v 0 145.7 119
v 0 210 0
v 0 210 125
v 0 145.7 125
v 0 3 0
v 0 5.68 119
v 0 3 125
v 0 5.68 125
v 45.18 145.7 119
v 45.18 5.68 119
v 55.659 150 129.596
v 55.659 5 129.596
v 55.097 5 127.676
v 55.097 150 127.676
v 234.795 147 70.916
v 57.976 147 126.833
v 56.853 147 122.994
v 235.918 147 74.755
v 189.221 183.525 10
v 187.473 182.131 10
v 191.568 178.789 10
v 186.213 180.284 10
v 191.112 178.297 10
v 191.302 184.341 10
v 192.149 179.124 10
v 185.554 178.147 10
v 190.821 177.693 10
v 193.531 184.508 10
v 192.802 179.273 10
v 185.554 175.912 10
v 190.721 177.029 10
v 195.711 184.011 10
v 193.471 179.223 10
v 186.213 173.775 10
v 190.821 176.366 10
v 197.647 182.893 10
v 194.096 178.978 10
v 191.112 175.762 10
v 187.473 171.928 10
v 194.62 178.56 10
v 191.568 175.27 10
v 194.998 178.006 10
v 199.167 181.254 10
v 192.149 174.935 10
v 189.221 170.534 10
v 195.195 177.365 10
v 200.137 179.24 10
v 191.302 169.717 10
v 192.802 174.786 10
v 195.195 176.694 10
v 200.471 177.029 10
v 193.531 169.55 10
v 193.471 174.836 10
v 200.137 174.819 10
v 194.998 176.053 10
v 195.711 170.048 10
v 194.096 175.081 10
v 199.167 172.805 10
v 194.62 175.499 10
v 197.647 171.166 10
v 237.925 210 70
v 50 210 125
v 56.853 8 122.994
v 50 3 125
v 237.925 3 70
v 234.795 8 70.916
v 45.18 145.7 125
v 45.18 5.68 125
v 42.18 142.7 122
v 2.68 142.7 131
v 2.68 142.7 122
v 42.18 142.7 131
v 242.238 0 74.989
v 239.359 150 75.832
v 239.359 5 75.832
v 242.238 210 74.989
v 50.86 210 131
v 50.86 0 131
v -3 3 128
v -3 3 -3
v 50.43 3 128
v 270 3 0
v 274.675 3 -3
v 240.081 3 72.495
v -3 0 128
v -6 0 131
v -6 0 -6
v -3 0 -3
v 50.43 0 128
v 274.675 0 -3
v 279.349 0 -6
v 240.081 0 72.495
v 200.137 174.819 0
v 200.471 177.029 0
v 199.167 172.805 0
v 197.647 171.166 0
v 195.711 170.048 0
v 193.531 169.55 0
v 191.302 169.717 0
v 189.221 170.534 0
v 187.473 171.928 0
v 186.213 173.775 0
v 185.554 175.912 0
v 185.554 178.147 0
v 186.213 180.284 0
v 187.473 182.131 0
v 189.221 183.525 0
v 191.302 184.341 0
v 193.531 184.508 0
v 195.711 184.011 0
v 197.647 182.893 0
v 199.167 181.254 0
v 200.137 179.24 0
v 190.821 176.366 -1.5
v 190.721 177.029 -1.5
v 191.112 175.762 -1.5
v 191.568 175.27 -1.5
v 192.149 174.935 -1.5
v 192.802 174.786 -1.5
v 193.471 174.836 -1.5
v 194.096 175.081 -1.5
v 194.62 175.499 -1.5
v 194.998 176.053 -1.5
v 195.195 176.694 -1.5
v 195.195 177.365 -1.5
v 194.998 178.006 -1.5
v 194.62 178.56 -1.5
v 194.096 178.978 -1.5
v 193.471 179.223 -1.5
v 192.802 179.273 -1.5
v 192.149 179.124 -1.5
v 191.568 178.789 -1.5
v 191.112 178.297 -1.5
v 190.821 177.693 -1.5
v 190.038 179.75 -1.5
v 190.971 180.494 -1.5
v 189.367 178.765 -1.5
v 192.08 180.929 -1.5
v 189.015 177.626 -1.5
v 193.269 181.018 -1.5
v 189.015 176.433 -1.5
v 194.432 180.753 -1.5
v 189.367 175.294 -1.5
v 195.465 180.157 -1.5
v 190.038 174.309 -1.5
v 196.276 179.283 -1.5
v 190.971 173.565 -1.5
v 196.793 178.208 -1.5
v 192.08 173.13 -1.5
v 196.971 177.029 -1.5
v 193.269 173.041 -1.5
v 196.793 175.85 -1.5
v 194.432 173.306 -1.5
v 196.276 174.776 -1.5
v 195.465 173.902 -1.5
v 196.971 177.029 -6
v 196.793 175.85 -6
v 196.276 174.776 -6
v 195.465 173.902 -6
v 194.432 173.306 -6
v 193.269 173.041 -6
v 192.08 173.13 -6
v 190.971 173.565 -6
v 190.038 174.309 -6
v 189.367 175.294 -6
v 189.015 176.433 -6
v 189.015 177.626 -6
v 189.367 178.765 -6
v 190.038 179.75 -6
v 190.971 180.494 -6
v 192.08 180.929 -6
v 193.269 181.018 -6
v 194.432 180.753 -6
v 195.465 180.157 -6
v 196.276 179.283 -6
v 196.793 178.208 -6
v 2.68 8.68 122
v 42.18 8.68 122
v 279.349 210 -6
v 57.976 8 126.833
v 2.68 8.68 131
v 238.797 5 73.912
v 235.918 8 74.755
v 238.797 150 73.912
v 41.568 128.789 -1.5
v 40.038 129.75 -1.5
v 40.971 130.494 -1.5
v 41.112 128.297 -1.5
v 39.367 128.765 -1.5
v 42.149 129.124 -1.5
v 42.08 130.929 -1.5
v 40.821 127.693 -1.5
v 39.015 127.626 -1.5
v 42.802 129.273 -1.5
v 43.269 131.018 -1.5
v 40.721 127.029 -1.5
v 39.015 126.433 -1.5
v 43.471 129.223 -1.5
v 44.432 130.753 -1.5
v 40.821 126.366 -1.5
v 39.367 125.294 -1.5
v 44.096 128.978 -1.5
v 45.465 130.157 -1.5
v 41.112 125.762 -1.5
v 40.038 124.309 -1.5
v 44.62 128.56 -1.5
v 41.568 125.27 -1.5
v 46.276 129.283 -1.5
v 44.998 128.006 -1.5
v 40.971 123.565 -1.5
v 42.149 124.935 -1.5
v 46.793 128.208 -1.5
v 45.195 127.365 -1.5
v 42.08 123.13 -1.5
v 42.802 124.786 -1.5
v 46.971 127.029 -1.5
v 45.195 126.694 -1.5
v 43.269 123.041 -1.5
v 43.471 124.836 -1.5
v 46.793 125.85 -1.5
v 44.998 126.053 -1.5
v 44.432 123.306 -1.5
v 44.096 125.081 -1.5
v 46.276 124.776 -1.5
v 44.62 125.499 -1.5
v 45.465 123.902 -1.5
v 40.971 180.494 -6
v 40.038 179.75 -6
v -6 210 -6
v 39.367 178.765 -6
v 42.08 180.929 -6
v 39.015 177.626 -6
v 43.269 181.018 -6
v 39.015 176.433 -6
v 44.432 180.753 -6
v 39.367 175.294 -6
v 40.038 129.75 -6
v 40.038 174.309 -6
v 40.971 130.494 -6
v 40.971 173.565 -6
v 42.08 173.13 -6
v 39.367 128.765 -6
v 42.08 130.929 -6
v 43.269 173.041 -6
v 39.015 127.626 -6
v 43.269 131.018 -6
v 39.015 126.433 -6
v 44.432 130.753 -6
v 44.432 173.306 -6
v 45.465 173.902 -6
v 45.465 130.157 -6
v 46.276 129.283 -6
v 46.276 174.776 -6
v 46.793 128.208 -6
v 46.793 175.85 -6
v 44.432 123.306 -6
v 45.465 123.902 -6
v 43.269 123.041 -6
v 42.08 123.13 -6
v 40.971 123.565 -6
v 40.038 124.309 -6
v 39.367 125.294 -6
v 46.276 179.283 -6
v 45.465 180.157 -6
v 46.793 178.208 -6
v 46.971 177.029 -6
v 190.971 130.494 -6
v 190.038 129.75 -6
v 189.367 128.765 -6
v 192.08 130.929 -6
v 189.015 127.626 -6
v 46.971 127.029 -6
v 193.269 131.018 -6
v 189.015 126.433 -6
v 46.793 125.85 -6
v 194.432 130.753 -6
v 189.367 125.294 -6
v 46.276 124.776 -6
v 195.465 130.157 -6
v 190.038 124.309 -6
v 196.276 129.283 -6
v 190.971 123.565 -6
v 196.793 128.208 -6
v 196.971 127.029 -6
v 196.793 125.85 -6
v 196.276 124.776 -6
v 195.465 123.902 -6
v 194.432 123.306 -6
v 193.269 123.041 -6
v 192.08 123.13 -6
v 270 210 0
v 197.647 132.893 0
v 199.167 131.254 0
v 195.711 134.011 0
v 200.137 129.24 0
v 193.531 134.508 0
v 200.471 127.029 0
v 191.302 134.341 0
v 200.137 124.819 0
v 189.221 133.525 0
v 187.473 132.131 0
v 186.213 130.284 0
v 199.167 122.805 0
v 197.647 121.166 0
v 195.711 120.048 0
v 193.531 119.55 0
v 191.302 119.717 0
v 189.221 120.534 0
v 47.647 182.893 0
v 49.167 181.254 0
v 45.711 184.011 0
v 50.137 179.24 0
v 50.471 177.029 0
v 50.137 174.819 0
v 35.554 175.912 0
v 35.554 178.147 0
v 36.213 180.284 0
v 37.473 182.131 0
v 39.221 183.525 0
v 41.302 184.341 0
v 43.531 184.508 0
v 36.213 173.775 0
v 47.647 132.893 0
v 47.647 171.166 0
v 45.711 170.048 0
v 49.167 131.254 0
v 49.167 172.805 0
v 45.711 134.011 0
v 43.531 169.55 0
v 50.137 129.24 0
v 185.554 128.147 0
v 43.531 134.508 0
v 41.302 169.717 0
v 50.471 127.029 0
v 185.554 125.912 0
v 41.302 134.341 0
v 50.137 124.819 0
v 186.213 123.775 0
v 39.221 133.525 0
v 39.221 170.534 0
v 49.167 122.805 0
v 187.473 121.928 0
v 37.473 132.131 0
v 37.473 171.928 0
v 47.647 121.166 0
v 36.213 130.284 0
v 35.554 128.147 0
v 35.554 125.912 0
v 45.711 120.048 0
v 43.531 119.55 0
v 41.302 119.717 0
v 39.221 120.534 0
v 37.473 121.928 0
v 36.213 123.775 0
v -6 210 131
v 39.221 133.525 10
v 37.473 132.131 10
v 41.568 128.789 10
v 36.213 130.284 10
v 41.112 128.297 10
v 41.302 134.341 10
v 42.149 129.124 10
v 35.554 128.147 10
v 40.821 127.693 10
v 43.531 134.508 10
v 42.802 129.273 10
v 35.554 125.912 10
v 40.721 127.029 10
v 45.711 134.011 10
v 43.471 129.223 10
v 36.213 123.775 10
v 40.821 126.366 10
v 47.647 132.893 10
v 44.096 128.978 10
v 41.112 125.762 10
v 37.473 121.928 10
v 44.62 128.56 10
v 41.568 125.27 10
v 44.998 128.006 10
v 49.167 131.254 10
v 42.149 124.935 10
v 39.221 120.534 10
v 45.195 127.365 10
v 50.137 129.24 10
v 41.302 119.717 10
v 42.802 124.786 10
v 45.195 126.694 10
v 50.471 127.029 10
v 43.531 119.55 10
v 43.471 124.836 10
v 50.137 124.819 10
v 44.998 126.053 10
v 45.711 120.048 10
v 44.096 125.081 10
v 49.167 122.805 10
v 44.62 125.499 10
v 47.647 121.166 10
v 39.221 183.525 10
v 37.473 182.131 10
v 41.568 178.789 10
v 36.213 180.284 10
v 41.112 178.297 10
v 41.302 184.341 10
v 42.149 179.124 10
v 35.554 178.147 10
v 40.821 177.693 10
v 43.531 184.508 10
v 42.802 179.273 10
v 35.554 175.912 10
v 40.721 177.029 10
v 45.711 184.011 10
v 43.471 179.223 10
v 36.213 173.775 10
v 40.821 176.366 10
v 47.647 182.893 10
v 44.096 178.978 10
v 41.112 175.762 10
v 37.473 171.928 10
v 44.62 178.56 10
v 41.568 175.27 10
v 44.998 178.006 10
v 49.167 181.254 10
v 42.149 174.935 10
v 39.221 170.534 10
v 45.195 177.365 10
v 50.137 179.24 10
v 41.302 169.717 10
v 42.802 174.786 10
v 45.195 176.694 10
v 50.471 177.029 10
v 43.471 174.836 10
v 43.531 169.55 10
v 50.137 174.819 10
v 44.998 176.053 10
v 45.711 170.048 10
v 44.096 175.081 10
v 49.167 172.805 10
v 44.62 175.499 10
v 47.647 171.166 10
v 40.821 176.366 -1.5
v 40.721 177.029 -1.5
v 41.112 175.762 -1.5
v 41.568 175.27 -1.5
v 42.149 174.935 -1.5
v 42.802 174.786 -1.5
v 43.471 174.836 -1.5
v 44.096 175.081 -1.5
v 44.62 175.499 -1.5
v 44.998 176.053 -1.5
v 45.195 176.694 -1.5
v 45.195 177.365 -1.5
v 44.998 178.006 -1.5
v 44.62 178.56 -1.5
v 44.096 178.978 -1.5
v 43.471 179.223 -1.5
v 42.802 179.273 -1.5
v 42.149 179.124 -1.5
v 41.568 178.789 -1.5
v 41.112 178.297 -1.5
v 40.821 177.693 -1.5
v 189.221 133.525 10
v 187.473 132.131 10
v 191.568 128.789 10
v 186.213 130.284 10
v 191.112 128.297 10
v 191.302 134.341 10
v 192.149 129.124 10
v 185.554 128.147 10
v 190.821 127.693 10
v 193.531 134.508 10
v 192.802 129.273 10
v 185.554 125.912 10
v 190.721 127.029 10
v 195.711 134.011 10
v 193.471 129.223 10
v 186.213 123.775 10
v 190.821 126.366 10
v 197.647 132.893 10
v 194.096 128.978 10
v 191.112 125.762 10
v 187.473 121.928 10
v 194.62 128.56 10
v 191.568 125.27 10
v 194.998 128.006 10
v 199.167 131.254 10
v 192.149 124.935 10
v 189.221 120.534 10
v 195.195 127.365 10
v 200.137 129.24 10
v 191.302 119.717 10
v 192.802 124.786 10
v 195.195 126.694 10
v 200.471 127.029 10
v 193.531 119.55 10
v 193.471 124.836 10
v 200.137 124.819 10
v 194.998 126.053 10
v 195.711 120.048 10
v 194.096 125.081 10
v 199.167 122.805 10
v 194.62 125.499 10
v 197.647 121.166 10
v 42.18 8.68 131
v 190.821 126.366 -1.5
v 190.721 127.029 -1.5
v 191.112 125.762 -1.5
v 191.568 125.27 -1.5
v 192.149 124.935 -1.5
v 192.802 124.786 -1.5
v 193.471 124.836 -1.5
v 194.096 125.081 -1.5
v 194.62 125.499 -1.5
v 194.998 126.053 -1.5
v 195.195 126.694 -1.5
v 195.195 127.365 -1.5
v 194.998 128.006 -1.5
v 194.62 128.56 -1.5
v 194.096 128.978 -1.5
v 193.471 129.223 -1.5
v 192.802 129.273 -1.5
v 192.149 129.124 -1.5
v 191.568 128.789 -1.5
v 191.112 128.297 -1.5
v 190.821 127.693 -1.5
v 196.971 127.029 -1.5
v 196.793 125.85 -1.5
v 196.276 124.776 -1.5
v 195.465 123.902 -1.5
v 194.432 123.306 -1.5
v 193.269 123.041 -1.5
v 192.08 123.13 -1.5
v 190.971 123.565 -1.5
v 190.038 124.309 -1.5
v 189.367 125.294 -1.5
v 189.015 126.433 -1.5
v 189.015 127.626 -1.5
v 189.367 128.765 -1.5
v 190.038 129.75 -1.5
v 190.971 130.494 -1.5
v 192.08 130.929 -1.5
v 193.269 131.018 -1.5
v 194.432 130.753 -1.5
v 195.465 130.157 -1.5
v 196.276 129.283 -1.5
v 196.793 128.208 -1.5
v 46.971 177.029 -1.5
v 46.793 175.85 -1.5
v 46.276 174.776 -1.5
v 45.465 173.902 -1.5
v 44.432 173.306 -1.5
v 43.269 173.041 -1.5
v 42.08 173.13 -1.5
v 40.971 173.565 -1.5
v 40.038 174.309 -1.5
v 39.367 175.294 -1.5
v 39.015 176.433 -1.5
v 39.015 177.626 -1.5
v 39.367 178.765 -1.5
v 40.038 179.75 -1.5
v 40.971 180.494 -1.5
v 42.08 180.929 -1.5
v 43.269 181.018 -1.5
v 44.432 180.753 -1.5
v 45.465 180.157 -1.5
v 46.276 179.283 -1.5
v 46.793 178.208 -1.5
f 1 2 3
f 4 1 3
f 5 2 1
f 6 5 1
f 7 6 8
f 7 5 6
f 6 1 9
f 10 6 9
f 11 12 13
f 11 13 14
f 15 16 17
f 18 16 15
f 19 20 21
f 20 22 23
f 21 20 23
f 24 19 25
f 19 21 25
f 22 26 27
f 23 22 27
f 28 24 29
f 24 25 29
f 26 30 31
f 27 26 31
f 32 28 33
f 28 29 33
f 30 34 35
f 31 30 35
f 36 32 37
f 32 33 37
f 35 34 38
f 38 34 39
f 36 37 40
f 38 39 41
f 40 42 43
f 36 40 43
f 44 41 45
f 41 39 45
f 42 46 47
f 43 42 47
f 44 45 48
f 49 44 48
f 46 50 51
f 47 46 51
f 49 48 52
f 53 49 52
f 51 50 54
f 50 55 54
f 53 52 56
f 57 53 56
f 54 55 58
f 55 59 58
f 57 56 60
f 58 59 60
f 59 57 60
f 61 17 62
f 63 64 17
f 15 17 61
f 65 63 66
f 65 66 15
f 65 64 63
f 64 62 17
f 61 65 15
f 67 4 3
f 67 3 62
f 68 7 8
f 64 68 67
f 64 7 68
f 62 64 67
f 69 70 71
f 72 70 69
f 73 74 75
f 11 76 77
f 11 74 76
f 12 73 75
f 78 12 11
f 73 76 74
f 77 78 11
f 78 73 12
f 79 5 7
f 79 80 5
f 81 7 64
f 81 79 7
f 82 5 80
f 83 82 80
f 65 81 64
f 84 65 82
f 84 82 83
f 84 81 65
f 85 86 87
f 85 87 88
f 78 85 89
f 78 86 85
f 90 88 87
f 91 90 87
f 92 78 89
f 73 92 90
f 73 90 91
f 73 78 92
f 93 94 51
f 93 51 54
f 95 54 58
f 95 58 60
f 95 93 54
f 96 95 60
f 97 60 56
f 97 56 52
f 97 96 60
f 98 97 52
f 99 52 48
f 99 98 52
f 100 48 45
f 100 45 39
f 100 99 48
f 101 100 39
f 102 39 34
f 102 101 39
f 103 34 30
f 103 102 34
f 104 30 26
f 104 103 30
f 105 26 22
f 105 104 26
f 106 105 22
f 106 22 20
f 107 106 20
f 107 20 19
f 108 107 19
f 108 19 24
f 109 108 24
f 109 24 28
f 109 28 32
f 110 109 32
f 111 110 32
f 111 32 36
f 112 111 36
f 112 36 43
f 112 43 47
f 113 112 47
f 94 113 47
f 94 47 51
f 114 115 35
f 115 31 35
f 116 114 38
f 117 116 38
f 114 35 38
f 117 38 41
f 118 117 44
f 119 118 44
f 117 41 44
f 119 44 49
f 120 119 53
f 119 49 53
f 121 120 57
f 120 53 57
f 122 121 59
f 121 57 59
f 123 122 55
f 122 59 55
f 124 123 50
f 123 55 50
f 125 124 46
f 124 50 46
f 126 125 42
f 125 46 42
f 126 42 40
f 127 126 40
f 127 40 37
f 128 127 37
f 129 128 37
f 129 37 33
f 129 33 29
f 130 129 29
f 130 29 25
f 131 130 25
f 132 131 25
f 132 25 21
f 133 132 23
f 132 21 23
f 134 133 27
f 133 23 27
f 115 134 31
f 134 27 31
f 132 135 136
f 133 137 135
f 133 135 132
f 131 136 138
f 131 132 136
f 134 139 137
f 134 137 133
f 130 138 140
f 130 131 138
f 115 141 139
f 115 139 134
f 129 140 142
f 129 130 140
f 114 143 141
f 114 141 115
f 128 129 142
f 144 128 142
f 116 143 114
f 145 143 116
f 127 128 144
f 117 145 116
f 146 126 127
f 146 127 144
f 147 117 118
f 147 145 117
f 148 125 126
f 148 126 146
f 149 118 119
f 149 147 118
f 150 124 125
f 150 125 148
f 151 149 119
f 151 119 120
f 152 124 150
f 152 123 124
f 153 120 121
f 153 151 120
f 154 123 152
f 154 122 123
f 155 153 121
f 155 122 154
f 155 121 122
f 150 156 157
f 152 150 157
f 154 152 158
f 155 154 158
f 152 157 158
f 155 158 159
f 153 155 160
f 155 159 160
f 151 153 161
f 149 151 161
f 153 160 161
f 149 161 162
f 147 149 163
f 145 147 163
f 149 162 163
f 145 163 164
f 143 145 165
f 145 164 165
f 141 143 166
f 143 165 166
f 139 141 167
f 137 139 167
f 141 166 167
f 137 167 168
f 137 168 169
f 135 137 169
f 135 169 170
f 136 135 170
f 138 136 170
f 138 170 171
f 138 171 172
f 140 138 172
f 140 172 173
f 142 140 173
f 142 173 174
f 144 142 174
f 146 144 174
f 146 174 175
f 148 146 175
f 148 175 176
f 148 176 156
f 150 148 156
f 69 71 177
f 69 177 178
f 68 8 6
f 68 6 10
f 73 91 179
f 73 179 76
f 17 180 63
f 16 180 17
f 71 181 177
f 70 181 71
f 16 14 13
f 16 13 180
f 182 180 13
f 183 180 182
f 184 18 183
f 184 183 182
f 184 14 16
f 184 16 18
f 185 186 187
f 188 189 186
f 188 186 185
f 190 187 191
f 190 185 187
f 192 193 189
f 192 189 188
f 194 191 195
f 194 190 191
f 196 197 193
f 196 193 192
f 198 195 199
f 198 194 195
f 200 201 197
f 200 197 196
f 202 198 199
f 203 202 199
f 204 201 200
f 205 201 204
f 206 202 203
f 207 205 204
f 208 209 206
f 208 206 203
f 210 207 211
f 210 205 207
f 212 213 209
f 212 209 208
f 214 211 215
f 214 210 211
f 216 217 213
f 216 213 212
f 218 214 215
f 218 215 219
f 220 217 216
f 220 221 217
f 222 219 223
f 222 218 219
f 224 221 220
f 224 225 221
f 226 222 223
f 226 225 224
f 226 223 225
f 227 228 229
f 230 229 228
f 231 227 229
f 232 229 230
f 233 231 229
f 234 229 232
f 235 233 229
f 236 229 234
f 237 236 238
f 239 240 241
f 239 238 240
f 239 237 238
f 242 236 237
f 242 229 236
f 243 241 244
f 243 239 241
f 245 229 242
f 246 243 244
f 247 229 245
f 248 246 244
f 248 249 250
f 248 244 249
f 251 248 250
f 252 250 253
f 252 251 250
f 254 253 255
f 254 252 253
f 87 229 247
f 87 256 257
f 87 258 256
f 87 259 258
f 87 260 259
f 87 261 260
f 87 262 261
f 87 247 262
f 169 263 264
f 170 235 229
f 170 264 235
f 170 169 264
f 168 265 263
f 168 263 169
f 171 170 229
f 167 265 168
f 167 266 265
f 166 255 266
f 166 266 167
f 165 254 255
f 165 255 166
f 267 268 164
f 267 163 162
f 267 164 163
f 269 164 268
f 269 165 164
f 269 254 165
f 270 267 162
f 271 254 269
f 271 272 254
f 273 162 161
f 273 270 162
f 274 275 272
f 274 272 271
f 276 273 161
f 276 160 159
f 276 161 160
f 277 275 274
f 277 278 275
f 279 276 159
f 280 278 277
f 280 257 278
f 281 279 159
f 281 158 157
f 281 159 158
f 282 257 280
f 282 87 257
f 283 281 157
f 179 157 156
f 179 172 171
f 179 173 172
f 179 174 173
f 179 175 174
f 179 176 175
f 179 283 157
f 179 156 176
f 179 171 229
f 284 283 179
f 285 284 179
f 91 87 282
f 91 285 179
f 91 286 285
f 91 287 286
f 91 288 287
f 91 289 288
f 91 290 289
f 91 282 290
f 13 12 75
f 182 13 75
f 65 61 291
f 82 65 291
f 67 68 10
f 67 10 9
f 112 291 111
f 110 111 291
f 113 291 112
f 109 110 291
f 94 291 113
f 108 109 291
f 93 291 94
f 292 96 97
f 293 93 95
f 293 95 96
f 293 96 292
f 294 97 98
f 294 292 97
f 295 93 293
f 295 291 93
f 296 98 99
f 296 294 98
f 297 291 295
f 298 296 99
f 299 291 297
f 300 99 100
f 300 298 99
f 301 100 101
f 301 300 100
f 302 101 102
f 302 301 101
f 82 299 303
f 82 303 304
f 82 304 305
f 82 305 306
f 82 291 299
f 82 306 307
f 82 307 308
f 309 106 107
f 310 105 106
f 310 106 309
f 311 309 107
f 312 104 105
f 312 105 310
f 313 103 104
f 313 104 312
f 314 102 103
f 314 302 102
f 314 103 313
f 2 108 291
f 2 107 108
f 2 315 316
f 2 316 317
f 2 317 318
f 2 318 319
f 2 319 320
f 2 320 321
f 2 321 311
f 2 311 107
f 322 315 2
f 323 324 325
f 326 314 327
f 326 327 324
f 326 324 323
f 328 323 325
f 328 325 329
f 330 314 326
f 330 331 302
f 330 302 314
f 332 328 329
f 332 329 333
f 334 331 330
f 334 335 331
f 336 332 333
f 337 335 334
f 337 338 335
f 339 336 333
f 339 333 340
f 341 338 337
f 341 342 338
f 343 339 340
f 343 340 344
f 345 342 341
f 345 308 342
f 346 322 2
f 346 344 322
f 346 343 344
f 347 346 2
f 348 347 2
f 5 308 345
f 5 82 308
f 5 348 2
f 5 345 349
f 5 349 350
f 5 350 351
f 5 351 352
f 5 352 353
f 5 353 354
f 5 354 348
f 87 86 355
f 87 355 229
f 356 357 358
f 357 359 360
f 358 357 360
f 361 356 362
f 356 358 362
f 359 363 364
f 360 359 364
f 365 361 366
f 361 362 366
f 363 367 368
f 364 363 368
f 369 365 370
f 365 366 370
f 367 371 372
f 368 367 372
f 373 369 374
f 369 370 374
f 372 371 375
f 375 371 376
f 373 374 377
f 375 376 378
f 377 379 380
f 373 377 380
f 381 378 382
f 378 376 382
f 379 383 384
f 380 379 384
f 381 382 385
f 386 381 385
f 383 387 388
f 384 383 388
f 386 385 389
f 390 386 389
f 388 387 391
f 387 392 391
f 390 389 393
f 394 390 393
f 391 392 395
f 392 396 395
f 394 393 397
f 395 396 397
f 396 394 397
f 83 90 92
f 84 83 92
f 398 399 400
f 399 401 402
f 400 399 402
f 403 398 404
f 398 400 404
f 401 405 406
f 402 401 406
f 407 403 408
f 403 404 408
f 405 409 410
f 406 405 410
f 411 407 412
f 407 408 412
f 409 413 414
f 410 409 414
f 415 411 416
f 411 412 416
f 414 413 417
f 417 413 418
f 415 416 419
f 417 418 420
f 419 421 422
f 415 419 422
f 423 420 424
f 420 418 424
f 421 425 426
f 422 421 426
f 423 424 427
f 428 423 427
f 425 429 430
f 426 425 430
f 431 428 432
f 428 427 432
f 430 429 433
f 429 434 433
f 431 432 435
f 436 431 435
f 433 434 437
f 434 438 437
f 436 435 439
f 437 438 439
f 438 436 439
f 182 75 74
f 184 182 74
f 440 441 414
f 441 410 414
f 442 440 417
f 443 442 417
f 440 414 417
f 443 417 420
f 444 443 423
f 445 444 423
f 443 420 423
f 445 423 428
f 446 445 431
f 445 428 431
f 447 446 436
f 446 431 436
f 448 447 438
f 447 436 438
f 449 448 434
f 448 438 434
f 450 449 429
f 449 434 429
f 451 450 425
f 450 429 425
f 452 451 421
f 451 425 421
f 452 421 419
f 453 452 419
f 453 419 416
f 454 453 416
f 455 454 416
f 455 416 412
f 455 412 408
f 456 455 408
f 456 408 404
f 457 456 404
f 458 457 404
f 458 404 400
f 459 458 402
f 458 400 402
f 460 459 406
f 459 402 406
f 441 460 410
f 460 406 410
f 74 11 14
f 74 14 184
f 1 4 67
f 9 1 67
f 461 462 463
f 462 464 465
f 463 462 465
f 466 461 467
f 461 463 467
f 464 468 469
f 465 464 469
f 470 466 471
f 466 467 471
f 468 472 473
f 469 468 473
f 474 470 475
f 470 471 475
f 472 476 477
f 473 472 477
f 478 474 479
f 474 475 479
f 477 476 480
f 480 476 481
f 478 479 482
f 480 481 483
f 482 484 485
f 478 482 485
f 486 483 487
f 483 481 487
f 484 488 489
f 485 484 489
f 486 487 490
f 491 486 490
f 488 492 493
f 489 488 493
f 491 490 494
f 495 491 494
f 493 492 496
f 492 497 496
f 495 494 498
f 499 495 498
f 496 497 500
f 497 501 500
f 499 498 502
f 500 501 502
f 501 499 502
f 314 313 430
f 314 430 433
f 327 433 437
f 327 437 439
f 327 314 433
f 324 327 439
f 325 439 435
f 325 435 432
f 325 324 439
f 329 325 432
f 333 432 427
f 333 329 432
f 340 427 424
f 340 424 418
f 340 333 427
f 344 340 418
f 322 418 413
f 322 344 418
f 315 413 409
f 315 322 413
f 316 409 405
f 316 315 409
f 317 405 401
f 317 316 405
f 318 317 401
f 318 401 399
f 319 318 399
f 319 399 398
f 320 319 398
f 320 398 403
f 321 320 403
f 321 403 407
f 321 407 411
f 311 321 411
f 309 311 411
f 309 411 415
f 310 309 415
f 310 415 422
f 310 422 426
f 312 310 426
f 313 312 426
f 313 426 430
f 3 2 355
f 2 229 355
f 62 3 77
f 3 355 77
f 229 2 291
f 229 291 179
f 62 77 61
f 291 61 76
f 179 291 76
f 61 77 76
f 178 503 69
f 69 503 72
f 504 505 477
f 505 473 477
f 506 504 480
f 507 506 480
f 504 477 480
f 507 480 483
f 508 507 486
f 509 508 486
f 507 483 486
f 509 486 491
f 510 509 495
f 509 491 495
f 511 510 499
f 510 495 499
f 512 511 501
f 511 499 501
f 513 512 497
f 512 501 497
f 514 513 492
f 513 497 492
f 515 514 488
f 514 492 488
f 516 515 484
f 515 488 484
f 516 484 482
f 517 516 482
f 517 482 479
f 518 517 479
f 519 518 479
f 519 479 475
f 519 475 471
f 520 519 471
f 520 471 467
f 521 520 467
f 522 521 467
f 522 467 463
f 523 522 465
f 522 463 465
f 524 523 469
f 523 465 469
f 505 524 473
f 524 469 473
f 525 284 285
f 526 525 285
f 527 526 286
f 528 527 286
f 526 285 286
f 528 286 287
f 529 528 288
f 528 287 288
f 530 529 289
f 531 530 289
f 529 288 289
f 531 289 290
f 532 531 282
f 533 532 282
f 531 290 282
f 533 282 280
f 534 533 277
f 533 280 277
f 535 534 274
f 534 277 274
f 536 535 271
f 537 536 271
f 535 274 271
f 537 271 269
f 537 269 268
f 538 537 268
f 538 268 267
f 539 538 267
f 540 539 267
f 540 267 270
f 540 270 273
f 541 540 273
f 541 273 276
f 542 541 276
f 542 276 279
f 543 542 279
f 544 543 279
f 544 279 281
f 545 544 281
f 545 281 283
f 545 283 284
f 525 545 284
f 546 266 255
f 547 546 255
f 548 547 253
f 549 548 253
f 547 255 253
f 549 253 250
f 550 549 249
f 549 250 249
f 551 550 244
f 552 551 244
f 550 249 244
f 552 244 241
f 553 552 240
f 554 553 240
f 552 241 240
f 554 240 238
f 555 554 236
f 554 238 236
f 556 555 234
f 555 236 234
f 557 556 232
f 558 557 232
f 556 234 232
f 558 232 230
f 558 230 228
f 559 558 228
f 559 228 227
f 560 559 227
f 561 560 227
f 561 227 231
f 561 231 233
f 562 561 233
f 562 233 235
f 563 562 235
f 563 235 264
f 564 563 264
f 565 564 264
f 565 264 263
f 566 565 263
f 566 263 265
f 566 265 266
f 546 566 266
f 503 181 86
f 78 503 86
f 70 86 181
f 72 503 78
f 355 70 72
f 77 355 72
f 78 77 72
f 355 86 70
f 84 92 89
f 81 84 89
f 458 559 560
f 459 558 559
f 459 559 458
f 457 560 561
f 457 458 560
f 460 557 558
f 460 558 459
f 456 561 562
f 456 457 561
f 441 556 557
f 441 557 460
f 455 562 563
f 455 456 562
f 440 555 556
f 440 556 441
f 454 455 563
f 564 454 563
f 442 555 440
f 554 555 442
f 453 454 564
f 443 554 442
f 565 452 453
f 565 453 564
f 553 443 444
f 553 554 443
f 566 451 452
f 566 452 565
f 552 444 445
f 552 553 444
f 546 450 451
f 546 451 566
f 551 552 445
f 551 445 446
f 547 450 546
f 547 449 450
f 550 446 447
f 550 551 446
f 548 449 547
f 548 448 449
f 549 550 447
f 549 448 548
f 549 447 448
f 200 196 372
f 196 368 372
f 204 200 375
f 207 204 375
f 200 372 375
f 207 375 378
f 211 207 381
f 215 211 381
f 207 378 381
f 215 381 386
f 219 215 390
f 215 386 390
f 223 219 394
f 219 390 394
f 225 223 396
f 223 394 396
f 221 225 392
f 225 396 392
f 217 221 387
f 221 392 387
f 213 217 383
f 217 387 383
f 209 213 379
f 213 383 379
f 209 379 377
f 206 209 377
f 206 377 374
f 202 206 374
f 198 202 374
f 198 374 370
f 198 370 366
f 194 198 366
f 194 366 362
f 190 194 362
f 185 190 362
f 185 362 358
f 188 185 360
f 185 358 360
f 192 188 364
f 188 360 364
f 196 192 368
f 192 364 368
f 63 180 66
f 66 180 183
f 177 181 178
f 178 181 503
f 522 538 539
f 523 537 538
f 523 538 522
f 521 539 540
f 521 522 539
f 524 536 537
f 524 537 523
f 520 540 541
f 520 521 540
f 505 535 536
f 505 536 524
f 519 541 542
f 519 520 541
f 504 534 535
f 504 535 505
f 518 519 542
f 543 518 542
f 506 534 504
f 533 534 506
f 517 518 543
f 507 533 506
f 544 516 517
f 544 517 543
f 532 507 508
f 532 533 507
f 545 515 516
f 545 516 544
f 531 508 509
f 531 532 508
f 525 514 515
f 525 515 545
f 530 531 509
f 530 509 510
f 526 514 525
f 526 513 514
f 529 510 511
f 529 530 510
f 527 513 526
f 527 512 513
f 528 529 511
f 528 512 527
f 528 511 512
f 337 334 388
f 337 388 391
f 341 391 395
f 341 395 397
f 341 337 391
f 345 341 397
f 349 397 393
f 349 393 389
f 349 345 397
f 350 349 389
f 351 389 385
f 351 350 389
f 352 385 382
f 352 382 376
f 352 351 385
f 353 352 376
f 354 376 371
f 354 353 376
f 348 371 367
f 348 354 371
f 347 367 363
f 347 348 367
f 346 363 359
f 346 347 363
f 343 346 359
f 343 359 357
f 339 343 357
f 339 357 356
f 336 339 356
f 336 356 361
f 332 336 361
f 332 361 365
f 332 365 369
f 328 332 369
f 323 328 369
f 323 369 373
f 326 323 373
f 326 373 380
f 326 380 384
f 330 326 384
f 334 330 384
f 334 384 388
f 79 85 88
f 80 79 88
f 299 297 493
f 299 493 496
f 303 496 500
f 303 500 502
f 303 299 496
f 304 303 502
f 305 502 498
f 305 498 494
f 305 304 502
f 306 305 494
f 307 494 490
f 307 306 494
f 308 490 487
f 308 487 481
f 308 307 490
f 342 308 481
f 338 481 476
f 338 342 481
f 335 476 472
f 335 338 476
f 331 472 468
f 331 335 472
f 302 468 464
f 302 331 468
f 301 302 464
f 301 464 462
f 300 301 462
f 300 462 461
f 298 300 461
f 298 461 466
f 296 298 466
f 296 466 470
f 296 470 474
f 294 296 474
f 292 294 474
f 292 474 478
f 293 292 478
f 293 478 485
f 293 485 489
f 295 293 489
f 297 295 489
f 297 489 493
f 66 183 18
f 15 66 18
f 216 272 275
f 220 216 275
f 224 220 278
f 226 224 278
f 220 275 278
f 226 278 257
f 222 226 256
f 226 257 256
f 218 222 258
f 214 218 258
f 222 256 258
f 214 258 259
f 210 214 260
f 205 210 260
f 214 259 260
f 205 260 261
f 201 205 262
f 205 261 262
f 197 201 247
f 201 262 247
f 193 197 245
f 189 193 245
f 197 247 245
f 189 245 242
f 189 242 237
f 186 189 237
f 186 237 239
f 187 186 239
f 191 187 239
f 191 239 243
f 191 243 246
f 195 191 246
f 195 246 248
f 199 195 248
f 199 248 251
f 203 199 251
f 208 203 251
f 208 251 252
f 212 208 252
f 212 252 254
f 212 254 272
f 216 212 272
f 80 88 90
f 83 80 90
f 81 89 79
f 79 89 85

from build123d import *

# Parameters (mm, degrees)
F2_DEPTH        = 210
F4_W            = 185.4063174448
F4_H            = 139
F5_DEPTH        = 6
F4_W_2          = 191.4063174448
F4_H_2          = 145
F6_DEPTH        = 2
F7_W            = 45.5
F7_H            = 140.02
F7_W_2          = 39.5
F7_H_2          = 134.02
F8_DEPTH        = 12
F9_DEPTH        = 9
F10_DEPTH       = 3
F3_R            = 7.5
F11_DEPTH       = 16
F12_D           = 4.5
F12_DEPTH       = 40
F12_CBORE_D     = 8
F12_CBORE_DEPTH = 4.5
F12_TIP         = 1.3519363928


with BuildPart() as f2:
    # F1 (on Front) → F2 (new body)
    with BuildSketch(Plane.XZ):
        Polygon((50.8599747535, 131), (-6, 131), (-6, -6), (279.3492325705, -6), (242.2383099785, 74.989177444), align=None)
        Polygon((240.0814283237, 72.494588722), (274.6746162852, -3), (-3, -3), (-3, 128), (50.4299873767, 128), align=None, mode=Mode.SUBTRACT)
        Polygon((-3, -3), (274.6746162852, -3), (240.0814283237, 72.494588722), (50.4299873767, 128), (-3, 128), align=None)
        Polygon((270, 0), (0, 0), (0, 125), (50, 125), (237.9245466688, 70), align=None, mode=Mode.SUBTRACT)
    extrude(amount=-F2_DEPTH)

    # F4 (on face) → F5 (cut, through all)
    with BuildSketch(Plane(origin=(39.3276682275, 0, 134.3751676945), x_dir=(0.9597405823, 0, -0.280887904), z_dir=(0.280887904, 0, 0.9597405823))):
        with Locations((112.7192250827, 77.5)):
            Rectangle(F4_W, F4_H)
    extrude(amount=-F5_DEPTH, mode=Mode.SUBTRACT)

    # F4 (on face) → F6 (cut)
    with BuildSketch(Plane(origin=(39.3276682275, 0, 134.3751676945), x_dir=(0.9597405823, 0, -0.280887904), z_dir=(0.280887904, 0, 0.9597405823))):
        with Locations((112.7192250827, 77.5)):
            Rectangle(F4_W_2, F4_H_2)
        with Locations((112.7192250827, 77.5)):
            Rectangle(F4_W, F4_H, mode=Mode.SUBTRACT)
    extrude(amount=-F6_DEPTH, mode=Mode.SUBTRACT)

    # F7 (on face) → F8 (join)
    with BuildSketch(Plane.XY.offset(131)):
        with Locations((22.4299873767, 75.6899873767)):
            Rectangle(F7_W, F7_H)
        with Locations((22.4299873767, 75.6899873767)):
            Rectangle(F7_W_2, F7_H_2, mode=Mode.SUBTRACT)
        with Locations((22.4299873767, 75.6899873767)):
            Rectangle(F7_W_2, F7_H_2)
    extrude(amount=-F8_DEPTH)

    # F7 (on face) → F9 (cut)
    with BuildSketch(Plane.XY.offset(131)):
        with Locations((22.4299873767, 75.6899873767)):
            Rectangle(F7_W_2, F7_H_2)
    extrude(amount=-F9_DEPTH, mode=Mode.SUBTRACT)

    # F1 (on Front) → F10 (cut)
    with BuildSketch(Plane.XZ):
        Polygon((-3, -3), (274.6746162852, -3), (240.0814283237, 72.494588722), (50.4299873767, 128), (-3, 128), align=None)
        Polygon((270, 0), (0, 0), (0, 125), (50, 125), (237.9245466688, 70), align=None, mode=Mode.SUBTRACT)
    extrude(amount=-F10_DEPTH, mode=Mode.SUBTRACT)

    # F3 (on face) → F11 (join)
    with BuildSketch(Plane(origin=(0, 0, -6), x_dir=(1, 0, 0), z_dir=(0, 0, -1))):
        with Locations((192.9705612659, -177.0294387341)):
            Circle(F3_R)
        with Locations((192.9705612659, -127.0294387341)):
            Circle(F3_R)
        with Locations((42.9705612659, -177.0294387341)):
            Circle(F3_R)
        with Locations((42.9705612659, -127.0294387341)):
            Circle(F3_R)
    extrude(amount=-F11_DEPTH)

    # F12
    with Locations(Plane(origin=(0, 0, -6), x_dir=(1, 0, 0), z_dir=(0, 0, -1))):
        with Locations((192.9705612659, -127.0294387341), (192.9705612659, -177.0294387341), (42.9705612659, -177.0294387341), (42.9705612659, -127.0294387341)):
            CounterBoreHole(F12_D / 2, F12_CBORE_D / 2, F12_CBORE_DEPTH, depth=F12_DEPTH)
            with Locations((0, 0, -(F12_DEPTH + F12_TIP / 2))):  # 118° drill point
                Cone(0, F12_D / 2, F12_TIP, mode=Mode.SUBTRACT)


solid = f2.part
